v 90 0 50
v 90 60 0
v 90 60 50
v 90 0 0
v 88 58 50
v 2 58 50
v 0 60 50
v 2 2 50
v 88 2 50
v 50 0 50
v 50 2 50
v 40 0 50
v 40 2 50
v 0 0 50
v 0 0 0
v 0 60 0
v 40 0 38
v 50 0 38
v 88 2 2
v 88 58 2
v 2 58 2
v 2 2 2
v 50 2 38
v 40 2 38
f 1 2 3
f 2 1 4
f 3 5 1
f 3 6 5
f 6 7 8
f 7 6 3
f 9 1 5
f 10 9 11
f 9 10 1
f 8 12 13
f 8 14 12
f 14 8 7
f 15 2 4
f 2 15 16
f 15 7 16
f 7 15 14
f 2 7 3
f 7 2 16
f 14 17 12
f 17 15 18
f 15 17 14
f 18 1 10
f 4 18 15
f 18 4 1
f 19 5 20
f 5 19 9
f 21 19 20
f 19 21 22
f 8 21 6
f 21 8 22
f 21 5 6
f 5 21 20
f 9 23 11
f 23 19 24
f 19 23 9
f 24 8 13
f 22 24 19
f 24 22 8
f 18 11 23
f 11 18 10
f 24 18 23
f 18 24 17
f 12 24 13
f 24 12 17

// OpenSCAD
$fn = 32;

// ----------------------------------------------------------------------
// Enclosure box: notch enclosure
// ----------------------------------------------------------------------

// --- parameters (mm) ---
box_l = 90;               // outer length, X
box_w = 60;               // outer width, Y
box_h = 50;               // outer height
wall_t = 2;               // wall thickness
notch_w = 10;             // cable notch width
notch_h = 12;             // cable notch height

inner_h = box_h - wall_t;  // cavity depth
boss_h = inner_h - 2;  // corner boss height

difference() {
  cube([box_l, box_w, box_h]);
  translate([wall_t, wall_t, wall_t])
    cube([box_l - 2 * wall_t, box_w - 2 * wall_t, box_h]);
  translate([box_l / 2 - notch_w / 2, -1, box_h - notch_h])
    cube([notch_w, wall_t + 2, notch_h + 1]);
}
